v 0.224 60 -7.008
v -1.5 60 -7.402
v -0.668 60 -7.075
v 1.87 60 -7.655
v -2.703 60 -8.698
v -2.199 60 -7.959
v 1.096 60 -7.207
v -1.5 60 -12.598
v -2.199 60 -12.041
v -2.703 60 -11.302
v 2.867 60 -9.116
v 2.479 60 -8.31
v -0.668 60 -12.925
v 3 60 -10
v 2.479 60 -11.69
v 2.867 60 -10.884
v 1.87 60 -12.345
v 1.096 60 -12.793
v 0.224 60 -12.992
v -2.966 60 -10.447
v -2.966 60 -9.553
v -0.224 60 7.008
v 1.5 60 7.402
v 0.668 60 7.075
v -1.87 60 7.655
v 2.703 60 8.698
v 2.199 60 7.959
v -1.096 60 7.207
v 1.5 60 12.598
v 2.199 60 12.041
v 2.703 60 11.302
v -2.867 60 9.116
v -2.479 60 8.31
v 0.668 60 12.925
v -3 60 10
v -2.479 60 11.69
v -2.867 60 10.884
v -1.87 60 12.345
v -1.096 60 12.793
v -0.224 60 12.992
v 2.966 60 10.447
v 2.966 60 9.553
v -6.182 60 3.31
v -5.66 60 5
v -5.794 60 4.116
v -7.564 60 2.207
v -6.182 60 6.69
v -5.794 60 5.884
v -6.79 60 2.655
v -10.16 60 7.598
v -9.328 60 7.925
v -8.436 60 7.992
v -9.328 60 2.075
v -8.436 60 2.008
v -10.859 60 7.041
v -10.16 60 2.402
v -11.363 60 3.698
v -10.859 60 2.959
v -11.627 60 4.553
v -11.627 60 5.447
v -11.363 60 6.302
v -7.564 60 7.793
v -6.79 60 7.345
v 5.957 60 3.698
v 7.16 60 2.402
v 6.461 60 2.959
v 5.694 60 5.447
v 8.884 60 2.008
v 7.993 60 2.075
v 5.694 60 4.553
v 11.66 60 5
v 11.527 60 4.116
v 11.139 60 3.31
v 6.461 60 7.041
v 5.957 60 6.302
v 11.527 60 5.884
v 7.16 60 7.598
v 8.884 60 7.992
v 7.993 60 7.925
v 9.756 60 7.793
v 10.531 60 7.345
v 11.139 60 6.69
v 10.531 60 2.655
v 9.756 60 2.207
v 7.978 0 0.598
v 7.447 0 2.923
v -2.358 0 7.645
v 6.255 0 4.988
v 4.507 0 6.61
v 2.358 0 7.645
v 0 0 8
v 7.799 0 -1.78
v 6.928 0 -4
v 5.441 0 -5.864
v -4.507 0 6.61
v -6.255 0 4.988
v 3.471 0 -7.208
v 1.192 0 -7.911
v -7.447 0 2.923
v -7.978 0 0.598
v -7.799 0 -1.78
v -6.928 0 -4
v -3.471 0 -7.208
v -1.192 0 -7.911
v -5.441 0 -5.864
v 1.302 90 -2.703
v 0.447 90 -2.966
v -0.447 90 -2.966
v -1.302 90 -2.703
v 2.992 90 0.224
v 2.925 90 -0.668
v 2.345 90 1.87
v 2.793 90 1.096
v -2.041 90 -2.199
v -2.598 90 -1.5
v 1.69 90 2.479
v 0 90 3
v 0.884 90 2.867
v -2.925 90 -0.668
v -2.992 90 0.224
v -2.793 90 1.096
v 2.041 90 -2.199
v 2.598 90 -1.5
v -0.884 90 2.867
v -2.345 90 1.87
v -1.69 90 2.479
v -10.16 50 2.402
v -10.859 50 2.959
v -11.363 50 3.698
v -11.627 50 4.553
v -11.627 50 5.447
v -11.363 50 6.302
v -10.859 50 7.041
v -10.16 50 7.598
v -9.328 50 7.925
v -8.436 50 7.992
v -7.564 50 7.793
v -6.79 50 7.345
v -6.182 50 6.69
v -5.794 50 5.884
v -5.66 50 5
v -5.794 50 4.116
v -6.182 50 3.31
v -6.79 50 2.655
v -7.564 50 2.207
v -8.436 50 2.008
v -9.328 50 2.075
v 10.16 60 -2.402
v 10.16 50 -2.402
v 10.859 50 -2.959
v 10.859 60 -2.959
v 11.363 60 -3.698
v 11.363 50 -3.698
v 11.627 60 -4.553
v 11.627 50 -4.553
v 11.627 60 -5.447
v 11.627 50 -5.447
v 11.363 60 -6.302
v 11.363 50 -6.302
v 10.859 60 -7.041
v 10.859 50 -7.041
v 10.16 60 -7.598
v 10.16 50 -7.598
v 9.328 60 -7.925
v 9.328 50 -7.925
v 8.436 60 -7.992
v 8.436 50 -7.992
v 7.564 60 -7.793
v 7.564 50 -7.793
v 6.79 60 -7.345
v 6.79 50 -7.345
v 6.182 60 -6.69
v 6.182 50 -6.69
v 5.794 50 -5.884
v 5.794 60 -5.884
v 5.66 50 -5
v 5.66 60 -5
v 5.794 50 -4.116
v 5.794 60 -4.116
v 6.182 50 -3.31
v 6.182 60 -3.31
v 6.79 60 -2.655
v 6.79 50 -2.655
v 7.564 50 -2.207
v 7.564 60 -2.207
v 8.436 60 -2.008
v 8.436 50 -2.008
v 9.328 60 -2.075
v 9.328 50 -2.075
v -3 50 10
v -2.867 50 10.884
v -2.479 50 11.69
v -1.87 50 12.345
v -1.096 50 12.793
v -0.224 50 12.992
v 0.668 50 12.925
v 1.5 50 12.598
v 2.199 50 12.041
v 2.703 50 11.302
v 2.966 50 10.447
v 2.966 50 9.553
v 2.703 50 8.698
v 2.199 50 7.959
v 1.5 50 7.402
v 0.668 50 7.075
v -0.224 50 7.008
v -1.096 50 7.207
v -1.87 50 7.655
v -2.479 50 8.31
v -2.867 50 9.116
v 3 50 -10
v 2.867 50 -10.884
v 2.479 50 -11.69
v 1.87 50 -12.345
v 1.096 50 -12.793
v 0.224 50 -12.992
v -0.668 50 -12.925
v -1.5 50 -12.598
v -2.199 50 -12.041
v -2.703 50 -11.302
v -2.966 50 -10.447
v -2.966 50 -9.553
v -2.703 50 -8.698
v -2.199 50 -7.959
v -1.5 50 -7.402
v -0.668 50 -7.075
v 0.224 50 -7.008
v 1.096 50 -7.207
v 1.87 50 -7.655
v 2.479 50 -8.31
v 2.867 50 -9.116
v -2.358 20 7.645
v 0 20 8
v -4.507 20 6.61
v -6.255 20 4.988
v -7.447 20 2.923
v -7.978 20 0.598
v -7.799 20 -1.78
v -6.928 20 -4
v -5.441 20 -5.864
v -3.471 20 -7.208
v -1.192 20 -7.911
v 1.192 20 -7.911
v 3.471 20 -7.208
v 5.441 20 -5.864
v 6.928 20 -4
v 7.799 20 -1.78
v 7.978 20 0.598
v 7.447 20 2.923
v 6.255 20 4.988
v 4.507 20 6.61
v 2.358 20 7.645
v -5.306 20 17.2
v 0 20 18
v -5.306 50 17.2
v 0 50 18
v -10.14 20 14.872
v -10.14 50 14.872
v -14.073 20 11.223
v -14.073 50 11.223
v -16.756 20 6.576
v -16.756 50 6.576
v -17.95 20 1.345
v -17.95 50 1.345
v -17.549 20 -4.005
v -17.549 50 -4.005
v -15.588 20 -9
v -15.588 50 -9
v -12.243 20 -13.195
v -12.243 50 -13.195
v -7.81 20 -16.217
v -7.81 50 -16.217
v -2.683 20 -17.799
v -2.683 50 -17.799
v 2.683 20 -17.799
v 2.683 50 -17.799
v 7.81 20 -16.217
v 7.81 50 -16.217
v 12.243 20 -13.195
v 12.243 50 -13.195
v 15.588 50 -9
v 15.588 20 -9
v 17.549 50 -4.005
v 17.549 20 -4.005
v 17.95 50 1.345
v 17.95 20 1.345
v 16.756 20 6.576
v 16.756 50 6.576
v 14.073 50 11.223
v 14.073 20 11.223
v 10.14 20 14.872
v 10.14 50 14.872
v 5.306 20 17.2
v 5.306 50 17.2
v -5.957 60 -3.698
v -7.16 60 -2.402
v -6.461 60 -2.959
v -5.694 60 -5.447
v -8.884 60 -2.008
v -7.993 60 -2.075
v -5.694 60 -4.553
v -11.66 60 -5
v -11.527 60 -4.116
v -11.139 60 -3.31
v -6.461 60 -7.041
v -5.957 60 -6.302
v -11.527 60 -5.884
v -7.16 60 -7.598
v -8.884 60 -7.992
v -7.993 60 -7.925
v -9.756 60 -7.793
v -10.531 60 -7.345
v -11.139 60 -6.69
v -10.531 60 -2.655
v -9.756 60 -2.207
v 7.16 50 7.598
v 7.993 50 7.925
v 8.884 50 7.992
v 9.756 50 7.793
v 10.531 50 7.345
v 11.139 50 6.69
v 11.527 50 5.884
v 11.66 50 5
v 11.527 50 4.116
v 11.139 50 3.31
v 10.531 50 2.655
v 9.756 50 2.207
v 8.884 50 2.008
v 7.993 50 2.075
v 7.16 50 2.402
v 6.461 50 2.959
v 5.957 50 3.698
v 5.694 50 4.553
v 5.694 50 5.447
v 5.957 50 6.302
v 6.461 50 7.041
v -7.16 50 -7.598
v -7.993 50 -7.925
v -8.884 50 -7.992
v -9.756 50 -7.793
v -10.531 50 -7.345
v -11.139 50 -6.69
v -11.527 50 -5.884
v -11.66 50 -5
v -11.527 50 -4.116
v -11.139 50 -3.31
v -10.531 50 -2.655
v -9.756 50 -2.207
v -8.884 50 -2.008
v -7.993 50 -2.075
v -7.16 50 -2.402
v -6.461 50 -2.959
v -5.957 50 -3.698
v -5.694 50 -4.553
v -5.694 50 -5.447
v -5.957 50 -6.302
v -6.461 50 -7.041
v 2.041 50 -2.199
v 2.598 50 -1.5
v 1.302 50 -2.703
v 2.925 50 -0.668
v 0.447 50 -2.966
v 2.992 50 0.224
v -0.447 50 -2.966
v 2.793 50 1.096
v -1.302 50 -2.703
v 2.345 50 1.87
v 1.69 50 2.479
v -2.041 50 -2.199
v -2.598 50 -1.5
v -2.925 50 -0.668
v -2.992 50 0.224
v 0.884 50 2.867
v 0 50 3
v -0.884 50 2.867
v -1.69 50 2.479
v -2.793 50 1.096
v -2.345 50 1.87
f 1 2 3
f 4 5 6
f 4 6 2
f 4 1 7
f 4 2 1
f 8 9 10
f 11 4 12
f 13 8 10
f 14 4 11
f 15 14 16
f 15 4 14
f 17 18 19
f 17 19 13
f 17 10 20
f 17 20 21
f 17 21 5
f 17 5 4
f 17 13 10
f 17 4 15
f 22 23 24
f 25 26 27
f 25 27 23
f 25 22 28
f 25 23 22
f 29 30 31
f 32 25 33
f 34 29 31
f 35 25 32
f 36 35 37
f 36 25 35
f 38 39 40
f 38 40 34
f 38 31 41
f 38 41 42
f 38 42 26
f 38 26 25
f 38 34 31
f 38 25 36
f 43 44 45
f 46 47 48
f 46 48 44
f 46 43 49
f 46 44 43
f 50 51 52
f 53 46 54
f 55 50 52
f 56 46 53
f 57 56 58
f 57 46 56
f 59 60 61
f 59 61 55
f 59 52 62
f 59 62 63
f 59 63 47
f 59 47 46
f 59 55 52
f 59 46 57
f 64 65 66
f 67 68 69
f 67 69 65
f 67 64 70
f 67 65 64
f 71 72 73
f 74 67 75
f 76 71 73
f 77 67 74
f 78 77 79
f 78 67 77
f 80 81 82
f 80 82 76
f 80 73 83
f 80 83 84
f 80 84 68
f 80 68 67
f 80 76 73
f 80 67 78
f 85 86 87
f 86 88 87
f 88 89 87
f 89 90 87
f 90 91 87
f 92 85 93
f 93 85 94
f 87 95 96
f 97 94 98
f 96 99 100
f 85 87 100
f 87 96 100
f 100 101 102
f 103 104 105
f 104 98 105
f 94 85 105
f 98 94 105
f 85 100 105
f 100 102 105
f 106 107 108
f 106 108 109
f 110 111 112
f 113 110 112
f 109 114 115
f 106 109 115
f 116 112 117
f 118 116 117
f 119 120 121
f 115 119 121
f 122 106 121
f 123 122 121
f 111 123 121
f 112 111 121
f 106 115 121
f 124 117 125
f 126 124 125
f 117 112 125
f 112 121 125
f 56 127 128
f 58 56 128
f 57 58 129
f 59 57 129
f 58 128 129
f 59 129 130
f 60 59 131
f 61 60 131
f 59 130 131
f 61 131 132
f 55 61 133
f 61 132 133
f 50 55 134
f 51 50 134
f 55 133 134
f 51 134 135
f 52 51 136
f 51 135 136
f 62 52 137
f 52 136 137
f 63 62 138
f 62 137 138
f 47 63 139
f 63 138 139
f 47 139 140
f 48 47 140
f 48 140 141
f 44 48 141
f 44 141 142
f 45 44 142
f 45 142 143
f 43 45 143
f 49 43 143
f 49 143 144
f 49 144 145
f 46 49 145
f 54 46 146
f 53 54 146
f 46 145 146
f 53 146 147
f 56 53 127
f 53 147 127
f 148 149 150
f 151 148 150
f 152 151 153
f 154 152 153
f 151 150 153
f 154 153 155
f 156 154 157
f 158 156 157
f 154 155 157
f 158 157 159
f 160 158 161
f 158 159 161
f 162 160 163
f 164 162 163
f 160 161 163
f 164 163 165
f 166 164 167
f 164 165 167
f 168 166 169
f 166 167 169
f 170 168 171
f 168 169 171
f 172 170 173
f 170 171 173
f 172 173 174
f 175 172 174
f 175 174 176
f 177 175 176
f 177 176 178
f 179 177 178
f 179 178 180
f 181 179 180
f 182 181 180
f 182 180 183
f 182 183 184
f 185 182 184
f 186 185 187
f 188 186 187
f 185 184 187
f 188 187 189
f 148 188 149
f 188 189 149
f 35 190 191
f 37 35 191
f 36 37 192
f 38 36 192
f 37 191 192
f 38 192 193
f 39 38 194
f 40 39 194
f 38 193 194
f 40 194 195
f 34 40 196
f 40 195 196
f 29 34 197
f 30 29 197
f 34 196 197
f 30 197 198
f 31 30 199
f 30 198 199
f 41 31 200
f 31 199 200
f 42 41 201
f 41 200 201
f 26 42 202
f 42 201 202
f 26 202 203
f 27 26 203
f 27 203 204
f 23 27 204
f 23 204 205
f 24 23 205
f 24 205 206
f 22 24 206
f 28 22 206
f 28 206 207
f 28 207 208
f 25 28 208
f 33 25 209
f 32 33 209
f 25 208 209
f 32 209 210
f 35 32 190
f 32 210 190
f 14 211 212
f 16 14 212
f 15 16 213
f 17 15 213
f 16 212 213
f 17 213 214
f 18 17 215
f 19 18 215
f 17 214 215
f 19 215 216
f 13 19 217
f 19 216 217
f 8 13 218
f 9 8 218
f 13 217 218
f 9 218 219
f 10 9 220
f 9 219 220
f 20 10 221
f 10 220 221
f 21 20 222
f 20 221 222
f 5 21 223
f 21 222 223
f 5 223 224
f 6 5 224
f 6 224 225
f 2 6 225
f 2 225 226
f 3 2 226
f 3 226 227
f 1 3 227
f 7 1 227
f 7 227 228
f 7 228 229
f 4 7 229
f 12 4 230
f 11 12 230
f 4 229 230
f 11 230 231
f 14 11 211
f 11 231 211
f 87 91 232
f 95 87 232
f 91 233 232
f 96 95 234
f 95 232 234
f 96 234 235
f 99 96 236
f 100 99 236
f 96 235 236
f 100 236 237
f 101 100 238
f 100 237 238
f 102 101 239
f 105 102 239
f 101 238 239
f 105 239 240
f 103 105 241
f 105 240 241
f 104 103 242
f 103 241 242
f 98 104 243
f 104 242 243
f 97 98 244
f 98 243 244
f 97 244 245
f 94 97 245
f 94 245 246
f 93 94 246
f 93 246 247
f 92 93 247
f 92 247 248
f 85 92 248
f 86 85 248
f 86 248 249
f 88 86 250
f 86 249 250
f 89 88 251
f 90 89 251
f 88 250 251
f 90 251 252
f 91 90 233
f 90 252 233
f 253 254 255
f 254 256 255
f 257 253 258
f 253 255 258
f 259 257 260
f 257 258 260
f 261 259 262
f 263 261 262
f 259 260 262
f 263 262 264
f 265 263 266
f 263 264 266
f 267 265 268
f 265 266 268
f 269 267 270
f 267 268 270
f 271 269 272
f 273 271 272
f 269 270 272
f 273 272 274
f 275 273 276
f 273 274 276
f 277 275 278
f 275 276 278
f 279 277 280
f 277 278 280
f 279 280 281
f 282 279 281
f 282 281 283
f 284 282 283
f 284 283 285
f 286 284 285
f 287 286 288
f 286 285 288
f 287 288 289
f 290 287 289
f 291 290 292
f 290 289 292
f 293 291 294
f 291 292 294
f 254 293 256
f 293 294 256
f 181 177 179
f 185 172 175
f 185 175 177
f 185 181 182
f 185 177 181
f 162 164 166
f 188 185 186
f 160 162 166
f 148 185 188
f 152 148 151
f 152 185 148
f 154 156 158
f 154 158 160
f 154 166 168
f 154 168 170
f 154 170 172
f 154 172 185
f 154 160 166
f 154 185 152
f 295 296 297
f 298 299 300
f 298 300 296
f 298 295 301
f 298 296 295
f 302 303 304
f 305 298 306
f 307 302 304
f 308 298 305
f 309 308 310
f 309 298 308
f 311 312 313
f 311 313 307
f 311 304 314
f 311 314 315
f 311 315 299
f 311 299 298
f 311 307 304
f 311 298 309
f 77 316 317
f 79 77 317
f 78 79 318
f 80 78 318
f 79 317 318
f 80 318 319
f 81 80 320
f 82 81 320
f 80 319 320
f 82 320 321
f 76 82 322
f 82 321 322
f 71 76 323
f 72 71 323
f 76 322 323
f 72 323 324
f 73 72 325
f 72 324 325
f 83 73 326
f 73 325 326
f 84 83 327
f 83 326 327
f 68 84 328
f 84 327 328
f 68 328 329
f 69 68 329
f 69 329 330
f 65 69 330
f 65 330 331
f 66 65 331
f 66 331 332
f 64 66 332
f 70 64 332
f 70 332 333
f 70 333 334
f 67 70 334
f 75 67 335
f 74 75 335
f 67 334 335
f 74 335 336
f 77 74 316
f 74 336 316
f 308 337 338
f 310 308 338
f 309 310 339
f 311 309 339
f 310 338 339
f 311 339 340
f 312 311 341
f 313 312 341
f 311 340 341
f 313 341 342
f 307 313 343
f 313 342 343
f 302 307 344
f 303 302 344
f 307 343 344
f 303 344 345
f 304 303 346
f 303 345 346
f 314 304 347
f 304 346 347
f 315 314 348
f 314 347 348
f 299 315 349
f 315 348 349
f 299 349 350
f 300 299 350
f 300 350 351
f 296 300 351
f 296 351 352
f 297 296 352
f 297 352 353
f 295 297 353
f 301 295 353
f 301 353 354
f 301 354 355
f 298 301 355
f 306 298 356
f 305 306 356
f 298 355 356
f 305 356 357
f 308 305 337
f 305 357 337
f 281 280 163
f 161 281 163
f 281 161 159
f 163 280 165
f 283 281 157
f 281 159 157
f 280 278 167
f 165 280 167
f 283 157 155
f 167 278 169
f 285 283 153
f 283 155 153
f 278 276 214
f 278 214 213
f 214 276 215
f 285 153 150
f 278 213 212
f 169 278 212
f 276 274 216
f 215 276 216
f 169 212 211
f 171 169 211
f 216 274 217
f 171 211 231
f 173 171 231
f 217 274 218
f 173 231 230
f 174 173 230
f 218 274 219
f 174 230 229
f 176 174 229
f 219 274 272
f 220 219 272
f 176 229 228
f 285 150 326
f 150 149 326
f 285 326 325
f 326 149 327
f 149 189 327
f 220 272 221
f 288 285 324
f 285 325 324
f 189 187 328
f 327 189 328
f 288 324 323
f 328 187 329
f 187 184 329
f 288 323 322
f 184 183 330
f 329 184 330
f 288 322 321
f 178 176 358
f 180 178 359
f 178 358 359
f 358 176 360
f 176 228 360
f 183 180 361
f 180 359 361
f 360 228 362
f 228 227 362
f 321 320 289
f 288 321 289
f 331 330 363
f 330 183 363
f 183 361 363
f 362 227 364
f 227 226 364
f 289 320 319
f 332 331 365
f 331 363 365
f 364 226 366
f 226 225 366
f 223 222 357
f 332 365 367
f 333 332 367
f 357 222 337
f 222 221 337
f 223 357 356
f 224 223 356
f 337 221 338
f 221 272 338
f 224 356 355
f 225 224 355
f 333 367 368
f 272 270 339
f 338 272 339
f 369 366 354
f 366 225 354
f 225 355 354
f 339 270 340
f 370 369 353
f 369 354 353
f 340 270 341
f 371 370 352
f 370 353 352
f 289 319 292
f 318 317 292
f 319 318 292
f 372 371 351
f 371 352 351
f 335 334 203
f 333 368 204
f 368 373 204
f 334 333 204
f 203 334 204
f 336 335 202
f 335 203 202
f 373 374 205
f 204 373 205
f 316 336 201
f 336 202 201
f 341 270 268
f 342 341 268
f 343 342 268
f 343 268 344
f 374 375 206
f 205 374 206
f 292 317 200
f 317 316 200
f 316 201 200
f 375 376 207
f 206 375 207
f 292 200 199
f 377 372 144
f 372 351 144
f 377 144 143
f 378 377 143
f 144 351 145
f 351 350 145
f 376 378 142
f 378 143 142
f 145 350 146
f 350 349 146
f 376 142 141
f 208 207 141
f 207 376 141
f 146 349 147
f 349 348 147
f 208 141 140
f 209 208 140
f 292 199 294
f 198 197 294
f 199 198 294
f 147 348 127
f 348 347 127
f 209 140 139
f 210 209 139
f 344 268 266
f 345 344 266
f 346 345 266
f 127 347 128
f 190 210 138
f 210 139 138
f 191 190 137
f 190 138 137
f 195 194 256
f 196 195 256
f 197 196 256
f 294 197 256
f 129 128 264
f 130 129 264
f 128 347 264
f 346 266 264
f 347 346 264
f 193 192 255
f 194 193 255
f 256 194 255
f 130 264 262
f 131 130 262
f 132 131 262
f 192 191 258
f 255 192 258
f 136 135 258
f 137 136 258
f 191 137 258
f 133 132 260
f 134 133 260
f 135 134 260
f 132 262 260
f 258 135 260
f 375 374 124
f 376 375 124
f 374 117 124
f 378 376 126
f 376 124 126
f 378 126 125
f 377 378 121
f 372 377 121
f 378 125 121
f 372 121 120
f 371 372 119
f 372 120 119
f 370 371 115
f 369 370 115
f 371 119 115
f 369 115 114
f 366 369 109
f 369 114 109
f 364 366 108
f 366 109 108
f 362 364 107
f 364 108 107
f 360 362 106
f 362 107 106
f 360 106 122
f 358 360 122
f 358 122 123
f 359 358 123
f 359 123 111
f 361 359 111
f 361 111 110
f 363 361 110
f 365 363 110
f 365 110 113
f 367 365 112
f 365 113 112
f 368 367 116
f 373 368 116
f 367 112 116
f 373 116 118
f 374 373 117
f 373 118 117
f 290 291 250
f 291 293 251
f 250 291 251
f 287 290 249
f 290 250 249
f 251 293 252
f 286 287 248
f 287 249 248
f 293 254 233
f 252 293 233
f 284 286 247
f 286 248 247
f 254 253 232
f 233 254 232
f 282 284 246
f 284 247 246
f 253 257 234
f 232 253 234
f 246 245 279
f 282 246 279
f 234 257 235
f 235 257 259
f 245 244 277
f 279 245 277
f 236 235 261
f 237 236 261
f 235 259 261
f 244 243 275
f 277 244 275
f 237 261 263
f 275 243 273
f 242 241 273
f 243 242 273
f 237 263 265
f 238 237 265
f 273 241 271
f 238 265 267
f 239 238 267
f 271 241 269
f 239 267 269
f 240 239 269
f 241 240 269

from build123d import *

# Parameters (mm, degrees)
SKETCH2_R           = 3
BOSS_EXTRUDE1_DEPTH = 10
CIRPATTERN1_COUNT   = 6


with BuildPart() as part:
    # Sketch1 → Revolve1 (revolve)
    with BuildSketch(Plane(origin=(0, 0, 0), x_dir=(0, 0, -1), z_dir=(1, 0, 0))):
        Polygon((0, 0), (-8, 0), (-8, 20), (-18, 20), (-18, 50), (-3, 50), (-3, 90), (0, 90), align=None)
    revolve(axis=Axis((0, 90, 0), (0, -1, 0)))

    # Sketch2 → Boss-Extrude1 (add)
    with BuildSketch(Plane(origin=(0, 50, 0), x_dir=(1, 0, 0), z_dir=(0, 1, 0))):
        with Locations((0, 10)):
            Circle(SKETCH2_R)
    boss_extrude1 = extrude(amount=BOSS_EXTRUDE1_DEPTH)

    # CirPattern1: Boss-Extrude1 ×6 about axis
    cirpattern1_axis = Axis((0, 0, 0), (0, 1, 0))
    for i in range(1, CIRPATTERN1_COUNT):
        add(boss_extrude1.rotate(cirpattern1_axis, i * 360 / CIRPATTERN1_COUNT))


solid = part.part
